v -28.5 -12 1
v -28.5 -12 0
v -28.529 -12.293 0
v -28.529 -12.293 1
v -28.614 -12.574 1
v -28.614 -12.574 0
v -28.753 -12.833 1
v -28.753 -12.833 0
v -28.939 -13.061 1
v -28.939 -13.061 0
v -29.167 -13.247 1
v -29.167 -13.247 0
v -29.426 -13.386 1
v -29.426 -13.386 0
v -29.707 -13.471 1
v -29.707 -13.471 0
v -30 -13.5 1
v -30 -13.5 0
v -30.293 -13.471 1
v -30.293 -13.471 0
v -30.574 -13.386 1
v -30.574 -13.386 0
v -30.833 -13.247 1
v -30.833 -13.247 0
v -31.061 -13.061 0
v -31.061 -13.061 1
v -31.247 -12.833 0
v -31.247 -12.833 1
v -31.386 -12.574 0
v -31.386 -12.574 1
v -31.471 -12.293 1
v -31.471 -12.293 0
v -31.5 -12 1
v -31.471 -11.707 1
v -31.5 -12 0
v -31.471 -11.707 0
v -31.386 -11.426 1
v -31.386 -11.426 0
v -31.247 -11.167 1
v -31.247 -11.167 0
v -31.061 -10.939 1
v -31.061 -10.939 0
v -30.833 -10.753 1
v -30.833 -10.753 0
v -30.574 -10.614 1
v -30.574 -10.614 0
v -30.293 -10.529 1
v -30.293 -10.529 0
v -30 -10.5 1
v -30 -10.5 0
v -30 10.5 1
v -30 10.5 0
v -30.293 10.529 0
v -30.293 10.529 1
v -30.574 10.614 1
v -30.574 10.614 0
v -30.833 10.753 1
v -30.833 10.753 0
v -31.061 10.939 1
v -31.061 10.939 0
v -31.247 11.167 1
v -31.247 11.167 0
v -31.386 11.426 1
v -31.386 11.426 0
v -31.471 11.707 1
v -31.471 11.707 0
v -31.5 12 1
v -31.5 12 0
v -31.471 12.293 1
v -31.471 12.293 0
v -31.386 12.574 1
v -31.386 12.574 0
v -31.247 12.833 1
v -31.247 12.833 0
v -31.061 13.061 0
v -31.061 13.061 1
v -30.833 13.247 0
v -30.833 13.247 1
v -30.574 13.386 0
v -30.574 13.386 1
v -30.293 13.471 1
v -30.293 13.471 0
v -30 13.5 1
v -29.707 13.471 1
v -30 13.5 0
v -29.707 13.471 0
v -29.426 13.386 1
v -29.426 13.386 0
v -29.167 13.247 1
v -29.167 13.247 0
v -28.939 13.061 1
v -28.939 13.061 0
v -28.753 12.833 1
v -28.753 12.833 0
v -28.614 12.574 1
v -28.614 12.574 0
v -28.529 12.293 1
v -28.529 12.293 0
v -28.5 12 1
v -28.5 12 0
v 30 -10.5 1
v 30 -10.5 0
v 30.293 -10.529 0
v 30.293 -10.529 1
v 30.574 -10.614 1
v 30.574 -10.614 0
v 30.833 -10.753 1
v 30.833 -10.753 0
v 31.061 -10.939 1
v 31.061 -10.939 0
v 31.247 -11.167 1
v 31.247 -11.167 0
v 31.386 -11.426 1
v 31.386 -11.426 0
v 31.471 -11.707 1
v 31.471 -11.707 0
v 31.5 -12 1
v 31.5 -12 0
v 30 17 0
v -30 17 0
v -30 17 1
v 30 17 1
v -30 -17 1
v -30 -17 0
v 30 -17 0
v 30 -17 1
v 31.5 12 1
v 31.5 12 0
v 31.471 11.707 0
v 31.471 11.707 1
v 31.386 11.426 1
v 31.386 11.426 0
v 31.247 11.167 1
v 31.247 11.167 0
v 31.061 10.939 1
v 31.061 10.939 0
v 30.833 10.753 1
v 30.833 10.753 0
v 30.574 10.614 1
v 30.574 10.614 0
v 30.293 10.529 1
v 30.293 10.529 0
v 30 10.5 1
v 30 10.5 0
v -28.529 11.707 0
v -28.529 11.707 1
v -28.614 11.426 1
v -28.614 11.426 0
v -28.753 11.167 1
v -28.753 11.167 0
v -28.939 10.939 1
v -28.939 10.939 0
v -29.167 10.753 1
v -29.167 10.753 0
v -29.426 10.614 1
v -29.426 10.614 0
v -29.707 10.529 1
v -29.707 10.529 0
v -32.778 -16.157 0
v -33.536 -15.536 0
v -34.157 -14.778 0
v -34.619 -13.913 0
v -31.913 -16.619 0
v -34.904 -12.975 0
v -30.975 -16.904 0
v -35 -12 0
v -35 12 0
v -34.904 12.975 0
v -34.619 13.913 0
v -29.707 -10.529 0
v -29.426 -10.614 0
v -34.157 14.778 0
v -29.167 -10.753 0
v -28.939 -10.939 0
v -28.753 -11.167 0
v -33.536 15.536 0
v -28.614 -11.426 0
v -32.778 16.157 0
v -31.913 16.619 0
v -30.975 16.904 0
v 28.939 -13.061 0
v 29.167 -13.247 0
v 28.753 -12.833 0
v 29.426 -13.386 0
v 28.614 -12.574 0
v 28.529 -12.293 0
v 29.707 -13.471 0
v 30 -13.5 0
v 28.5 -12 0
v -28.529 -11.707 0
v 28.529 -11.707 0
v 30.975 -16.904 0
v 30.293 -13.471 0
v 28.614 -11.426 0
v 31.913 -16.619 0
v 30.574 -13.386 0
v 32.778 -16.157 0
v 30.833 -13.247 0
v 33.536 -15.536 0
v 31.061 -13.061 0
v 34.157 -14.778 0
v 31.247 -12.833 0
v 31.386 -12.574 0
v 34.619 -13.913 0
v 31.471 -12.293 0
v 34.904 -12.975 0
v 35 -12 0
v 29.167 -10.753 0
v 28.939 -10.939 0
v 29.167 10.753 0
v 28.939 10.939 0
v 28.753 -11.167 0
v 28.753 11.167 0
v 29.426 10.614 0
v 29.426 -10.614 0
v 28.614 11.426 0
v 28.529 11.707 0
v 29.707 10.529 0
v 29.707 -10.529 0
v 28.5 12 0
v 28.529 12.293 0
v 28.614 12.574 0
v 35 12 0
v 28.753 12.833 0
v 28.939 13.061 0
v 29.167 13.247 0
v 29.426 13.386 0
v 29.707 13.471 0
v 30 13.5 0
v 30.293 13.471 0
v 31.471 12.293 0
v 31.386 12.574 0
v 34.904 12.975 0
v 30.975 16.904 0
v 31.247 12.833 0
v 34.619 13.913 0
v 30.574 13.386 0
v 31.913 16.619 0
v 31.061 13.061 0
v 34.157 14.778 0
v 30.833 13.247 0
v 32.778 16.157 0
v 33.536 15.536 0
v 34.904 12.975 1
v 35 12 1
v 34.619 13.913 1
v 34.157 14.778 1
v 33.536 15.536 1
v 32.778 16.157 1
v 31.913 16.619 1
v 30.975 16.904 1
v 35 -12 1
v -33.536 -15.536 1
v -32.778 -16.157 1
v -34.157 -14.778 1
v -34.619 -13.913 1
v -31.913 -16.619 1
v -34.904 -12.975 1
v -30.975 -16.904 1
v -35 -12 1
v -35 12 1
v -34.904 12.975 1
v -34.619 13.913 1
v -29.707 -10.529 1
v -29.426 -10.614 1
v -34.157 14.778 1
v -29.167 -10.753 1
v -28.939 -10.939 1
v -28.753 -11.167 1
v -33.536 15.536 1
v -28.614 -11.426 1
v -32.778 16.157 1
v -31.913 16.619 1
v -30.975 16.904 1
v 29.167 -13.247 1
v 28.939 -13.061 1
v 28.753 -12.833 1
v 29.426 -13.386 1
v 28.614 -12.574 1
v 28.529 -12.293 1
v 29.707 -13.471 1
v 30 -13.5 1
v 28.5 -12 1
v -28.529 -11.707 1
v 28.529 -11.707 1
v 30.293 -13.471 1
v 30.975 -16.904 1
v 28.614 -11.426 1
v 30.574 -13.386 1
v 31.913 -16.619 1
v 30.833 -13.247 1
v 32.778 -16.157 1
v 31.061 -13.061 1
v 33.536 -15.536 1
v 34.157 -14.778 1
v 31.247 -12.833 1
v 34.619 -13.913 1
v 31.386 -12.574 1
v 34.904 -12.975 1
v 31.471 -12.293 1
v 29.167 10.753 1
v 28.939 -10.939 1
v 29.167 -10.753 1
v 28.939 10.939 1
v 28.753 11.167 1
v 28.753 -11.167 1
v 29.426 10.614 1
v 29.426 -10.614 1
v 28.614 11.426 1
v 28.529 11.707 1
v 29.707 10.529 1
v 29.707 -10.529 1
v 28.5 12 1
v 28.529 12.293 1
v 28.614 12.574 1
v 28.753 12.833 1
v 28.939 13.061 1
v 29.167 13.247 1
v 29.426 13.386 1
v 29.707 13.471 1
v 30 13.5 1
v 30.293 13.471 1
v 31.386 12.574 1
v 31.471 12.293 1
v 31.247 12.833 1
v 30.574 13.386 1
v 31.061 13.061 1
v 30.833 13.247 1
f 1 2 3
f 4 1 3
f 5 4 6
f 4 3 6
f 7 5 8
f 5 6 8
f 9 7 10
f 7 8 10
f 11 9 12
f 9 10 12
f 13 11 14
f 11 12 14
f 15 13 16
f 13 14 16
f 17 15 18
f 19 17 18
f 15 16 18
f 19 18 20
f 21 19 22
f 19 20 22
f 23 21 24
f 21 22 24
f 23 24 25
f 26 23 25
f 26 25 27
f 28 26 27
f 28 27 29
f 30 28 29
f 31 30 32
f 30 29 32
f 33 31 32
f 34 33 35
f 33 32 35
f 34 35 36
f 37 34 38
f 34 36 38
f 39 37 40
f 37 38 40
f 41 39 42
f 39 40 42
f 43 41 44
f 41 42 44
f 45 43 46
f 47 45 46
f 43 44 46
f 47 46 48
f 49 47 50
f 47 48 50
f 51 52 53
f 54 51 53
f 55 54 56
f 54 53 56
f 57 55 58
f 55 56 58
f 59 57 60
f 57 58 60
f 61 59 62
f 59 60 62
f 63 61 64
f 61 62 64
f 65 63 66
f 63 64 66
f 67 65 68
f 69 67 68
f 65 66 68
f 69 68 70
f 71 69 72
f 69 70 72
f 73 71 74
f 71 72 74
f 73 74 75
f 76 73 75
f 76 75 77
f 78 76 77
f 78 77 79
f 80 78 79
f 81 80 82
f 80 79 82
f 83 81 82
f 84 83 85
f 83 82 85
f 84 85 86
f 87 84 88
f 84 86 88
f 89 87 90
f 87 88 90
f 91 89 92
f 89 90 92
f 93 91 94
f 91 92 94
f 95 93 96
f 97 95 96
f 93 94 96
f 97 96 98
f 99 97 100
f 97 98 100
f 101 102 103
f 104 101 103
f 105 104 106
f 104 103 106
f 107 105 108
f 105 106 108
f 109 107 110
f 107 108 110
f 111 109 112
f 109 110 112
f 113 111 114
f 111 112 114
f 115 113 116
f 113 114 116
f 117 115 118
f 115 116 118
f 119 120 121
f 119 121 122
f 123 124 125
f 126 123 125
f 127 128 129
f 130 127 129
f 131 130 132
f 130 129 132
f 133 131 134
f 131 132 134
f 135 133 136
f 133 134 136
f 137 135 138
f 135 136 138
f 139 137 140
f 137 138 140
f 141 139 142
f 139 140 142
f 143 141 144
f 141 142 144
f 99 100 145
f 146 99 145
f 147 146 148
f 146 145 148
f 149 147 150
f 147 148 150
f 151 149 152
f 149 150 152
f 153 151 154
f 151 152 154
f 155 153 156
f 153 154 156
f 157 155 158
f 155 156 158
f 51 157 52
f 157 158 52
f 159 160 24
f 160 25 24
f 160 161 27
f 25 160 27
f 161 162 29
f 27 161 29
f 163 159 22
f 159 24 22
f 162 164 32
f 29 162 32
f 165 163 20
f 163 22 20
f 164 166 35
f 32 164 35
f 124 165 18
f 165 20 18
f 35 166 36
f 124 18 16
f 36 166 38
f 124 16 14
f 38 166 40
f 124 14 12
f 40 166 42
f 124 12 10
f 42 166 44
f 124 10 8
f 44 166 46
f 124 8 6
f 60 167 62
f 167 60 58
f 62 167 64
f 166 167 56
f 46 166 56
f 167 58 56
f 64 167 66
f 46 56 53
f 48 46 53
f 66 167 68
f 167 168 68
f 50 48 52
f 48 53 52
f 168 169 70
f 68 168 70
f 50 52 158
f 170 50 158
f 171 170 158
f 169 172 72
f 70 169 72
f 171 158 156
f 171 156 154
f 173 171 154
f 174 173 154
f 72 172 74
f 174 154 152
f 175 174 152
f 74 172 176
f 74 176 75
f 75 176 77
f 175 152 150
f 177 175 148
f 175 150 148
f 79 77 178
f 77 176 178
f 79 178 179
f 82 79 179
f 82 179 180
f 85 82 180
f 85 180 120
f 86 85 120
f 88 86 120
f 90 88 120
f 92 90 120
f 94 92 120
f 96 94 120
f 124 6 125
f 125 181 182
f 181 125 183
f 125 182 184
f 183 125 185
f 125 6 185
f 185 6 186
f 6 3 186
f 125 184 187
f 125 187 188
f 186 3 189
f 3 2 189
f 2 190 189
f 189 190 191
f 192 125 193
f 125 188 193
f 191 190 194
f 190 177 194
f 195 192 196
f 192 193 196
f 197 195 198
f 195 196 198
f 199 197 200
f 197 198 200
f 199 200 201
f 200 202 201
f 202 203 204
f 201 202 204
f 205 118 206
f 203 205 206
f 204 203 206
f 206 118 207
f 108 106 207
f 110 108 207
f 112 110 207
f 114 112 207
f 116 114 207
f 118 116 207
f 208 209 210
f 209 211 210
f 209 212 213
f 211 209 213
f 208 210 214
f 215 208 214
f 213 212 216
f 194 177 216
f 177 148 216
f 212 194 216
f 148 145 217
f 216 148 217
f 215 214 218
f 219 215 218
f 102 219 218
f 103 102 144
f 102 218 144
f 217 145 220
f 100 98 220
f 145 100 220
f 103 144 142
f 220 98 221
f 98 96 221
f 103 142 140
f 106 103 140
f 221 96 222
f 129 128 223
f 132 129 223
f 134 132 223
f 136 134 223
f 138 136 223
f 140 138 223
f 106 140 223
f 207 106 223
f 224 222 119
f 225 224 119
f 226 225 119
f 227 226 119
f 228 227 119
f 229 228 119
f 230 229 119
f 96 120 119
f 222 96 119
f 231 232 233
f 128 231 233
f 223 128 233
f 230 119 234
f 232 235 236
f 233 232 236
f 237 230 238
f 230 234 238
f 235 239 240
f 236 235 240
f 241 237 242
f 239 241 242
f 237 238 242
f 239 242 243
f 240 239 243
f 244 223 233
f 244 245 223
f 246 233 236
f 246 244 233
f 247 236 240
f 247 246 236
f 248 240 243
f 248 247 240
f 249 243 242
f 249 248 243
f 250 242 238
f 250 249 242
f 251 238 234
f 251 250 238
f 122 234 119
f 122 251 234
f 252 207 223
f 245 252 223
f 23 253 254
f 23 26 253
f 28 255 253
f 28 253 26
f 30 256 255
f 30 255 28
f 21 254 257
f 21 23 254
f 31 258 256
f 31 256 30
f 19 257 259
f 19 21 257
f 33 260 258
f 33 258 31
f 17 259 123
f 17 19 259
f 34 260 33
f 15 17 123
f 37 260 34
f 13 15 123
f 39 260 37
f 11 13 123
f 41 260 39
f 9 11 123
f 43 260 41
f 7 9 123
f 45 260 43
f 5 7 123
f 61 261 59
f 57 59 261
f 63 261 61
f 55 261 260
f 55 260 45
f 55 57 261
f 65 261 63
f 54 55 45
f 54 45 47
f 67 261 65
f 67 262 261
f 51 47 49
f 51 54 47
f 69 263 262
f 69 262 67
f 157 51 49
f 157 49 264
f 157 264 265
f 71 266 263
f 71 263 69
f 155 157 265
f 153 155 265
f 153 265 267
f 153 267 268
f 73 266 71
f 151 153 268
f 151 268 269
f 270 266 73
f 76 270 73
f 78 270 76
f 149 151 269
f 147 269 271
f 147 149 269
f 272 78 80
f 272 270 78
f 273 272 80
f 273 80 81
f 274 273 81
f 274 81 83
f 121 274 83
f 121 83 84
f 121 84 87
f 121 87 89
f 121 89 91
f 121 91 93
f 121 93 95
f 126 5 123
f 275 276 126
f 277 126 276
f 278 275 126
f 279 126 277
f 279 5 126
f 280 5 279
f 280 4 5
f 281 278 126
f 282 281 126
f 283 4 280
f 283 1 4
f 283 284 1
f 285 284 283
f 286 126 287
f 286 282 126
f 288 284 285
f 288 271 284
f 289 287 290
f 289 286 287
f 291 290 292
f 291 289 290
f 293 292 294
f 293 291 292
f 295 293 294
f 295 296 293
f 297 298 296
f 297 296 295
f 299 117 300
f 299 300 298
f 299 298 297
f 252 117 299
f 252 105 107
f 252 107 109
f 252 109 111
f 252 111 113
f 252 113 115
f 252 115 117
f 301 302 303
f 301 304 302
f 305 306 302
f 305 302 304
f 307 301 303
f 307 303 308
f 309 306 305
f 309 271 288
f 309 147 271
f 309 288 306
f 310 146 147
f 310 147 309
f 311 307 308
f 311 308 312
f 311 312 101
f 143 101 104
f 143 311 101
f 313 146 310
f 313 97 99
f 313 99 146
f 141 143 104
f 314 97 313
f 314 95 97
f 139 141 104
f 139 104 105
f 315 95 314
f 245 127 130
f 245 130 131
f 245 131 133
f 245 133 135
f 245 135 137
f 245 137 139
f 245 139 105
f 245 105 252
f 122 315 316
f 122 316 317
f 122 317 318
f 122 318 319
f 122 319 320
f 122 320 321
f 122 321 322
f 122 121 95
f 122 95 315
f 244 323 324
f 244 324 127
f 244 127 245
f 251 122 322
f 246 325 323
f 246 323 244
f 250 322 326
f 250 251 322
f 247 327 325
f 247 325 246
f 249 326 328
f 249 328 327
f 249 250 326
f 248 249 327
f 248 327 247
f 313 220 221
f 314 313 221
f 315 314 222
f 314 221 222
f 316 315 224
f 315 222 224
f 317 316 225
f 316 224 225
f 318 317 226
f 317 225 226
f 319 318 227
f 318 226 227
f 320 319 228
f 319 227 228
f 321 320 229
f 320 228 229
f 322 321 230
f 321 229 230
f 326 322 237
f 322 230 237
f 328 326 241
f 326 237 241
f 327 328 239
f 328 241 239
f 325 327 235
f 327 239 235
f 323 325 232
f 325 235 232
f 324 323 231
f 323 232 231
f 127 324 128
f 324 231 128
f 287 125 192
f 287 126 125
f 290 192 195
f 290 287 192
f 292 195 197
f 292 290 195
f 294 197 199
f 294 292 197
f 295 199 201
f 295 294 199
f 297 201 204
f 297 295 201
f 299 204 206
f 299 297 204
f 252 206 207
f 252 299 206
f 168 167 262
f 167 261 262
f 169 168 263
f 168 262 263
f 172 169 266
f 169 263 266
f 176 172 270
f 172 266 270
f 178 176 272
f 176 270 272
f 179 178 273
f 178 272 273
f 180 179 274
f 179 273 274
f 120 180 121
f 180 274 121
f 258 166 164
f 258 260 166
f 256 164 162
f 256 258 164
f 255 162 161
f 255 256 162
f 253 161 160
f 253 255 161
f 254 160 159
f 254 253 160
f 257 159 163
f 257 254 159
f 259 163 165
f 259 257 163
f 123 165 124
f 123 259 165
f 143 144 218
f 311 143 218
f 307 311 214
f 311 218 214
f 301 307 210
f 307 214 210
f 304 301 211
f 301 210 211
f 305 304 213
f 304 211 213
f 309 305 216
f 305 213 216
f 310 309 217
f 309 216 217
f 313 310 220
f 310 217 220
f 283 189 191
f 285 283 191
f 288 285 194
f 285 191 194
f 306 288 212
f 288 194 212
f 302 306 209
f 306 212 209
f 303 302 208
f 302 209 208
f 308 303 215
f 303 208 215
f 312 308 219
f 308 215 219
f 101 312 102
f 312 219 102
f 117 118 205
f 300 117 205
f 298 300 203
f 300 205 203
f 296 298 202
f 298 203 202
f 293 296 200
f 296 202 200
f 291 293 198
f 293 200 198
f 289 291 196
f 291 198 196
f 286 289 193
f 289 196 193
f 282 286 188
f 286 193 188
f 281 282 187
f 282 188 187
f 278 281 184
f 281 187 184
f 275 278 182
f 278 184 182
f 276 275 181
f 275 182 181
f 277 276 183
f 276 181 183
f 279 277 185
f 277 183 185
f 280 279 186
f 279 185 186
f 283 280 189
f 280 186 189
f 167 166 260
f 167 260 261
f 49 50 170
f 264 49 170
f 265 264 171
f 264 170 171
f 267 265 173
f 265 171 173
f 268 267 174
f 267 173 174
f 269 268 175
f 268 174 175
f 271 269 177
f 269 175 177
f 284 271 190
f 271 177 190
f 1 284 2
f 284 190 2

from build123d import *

# Parameters (mm, degrees)
F0_W     = 70
F0_H     = 34
F1_DEPTH = 1
F2_R     = 5


with BuildPart() as f1:
    # F0 (on Top) → F1 (new body)
    with BuildSketch(Plane.XY):
        Rectangle(F0_W, F0_H)
        with BuildLine():
            ThreePointArc((-30, 10.5), (-31.0606601718, 13.0606601718), (-28.5, 12))
            Line((-28.5, 12), (28.5, 12))
            ThreePointArc((28.5, 12), (30, 13.5), (31.5, 12))
            ThreePointArc((31.5, 12), (31.0606601718, 10.9393398282), (30, 10.5))
            Line((30, 10.5), (30, -10.5))
            ThreePointArc((30, -10.5), (31.0606601718, -10.9393398282), (31.5, -12))
            ThreePointArc((31.5, -12), (30, -13.5), (28.5, -12))
            Line((28.5, -12), (-28.5, -12))
            ThreePointArc((-28.5, -12), (-31.0606601718, -13.0606601718), (-30, -10.5))
            Line((-30, -10.5), (-30, 10.5))
        make_face(mode=Mode.SUBTRACT)
        with BuildLine():
            Line((28.5, 12), (-28.5, 12))
            ThreePointArc((-28.5, 12), (-28.9393398282, 10.9393398282), (-30, 10.5))
            Line((-30, 10.5), (-30, -10.5))
            ThreePointArc((-30, -10.5), (-28.9393398282, -10.9393398282), (-28.5, -12))
            Line((-28.5, -12), (28.5, -12))
            ThreePointArc((28.5, -12), (28.9393398282, -10.9393398282), (30, -10.5))
            Line((30, -10.5), (30, 10.5))
            ThreePointArc((30, 10.5), (28.9393398282, 10.9393398282), (28.5, 12))
        make_face()
    extrude(amount=F1_DEPTH)

    # F2
    f2_edges = [f1.edges().sort_by_distance(p)[0] for p in [
        (-35, -17, 0.5),
        (-35, 17, 0.5),
        (35, 17, 0.5),
        (35, -17, 0.5),
    ]]
    fillet(f2_edges, radius=F2_R)


solid = f1.part
